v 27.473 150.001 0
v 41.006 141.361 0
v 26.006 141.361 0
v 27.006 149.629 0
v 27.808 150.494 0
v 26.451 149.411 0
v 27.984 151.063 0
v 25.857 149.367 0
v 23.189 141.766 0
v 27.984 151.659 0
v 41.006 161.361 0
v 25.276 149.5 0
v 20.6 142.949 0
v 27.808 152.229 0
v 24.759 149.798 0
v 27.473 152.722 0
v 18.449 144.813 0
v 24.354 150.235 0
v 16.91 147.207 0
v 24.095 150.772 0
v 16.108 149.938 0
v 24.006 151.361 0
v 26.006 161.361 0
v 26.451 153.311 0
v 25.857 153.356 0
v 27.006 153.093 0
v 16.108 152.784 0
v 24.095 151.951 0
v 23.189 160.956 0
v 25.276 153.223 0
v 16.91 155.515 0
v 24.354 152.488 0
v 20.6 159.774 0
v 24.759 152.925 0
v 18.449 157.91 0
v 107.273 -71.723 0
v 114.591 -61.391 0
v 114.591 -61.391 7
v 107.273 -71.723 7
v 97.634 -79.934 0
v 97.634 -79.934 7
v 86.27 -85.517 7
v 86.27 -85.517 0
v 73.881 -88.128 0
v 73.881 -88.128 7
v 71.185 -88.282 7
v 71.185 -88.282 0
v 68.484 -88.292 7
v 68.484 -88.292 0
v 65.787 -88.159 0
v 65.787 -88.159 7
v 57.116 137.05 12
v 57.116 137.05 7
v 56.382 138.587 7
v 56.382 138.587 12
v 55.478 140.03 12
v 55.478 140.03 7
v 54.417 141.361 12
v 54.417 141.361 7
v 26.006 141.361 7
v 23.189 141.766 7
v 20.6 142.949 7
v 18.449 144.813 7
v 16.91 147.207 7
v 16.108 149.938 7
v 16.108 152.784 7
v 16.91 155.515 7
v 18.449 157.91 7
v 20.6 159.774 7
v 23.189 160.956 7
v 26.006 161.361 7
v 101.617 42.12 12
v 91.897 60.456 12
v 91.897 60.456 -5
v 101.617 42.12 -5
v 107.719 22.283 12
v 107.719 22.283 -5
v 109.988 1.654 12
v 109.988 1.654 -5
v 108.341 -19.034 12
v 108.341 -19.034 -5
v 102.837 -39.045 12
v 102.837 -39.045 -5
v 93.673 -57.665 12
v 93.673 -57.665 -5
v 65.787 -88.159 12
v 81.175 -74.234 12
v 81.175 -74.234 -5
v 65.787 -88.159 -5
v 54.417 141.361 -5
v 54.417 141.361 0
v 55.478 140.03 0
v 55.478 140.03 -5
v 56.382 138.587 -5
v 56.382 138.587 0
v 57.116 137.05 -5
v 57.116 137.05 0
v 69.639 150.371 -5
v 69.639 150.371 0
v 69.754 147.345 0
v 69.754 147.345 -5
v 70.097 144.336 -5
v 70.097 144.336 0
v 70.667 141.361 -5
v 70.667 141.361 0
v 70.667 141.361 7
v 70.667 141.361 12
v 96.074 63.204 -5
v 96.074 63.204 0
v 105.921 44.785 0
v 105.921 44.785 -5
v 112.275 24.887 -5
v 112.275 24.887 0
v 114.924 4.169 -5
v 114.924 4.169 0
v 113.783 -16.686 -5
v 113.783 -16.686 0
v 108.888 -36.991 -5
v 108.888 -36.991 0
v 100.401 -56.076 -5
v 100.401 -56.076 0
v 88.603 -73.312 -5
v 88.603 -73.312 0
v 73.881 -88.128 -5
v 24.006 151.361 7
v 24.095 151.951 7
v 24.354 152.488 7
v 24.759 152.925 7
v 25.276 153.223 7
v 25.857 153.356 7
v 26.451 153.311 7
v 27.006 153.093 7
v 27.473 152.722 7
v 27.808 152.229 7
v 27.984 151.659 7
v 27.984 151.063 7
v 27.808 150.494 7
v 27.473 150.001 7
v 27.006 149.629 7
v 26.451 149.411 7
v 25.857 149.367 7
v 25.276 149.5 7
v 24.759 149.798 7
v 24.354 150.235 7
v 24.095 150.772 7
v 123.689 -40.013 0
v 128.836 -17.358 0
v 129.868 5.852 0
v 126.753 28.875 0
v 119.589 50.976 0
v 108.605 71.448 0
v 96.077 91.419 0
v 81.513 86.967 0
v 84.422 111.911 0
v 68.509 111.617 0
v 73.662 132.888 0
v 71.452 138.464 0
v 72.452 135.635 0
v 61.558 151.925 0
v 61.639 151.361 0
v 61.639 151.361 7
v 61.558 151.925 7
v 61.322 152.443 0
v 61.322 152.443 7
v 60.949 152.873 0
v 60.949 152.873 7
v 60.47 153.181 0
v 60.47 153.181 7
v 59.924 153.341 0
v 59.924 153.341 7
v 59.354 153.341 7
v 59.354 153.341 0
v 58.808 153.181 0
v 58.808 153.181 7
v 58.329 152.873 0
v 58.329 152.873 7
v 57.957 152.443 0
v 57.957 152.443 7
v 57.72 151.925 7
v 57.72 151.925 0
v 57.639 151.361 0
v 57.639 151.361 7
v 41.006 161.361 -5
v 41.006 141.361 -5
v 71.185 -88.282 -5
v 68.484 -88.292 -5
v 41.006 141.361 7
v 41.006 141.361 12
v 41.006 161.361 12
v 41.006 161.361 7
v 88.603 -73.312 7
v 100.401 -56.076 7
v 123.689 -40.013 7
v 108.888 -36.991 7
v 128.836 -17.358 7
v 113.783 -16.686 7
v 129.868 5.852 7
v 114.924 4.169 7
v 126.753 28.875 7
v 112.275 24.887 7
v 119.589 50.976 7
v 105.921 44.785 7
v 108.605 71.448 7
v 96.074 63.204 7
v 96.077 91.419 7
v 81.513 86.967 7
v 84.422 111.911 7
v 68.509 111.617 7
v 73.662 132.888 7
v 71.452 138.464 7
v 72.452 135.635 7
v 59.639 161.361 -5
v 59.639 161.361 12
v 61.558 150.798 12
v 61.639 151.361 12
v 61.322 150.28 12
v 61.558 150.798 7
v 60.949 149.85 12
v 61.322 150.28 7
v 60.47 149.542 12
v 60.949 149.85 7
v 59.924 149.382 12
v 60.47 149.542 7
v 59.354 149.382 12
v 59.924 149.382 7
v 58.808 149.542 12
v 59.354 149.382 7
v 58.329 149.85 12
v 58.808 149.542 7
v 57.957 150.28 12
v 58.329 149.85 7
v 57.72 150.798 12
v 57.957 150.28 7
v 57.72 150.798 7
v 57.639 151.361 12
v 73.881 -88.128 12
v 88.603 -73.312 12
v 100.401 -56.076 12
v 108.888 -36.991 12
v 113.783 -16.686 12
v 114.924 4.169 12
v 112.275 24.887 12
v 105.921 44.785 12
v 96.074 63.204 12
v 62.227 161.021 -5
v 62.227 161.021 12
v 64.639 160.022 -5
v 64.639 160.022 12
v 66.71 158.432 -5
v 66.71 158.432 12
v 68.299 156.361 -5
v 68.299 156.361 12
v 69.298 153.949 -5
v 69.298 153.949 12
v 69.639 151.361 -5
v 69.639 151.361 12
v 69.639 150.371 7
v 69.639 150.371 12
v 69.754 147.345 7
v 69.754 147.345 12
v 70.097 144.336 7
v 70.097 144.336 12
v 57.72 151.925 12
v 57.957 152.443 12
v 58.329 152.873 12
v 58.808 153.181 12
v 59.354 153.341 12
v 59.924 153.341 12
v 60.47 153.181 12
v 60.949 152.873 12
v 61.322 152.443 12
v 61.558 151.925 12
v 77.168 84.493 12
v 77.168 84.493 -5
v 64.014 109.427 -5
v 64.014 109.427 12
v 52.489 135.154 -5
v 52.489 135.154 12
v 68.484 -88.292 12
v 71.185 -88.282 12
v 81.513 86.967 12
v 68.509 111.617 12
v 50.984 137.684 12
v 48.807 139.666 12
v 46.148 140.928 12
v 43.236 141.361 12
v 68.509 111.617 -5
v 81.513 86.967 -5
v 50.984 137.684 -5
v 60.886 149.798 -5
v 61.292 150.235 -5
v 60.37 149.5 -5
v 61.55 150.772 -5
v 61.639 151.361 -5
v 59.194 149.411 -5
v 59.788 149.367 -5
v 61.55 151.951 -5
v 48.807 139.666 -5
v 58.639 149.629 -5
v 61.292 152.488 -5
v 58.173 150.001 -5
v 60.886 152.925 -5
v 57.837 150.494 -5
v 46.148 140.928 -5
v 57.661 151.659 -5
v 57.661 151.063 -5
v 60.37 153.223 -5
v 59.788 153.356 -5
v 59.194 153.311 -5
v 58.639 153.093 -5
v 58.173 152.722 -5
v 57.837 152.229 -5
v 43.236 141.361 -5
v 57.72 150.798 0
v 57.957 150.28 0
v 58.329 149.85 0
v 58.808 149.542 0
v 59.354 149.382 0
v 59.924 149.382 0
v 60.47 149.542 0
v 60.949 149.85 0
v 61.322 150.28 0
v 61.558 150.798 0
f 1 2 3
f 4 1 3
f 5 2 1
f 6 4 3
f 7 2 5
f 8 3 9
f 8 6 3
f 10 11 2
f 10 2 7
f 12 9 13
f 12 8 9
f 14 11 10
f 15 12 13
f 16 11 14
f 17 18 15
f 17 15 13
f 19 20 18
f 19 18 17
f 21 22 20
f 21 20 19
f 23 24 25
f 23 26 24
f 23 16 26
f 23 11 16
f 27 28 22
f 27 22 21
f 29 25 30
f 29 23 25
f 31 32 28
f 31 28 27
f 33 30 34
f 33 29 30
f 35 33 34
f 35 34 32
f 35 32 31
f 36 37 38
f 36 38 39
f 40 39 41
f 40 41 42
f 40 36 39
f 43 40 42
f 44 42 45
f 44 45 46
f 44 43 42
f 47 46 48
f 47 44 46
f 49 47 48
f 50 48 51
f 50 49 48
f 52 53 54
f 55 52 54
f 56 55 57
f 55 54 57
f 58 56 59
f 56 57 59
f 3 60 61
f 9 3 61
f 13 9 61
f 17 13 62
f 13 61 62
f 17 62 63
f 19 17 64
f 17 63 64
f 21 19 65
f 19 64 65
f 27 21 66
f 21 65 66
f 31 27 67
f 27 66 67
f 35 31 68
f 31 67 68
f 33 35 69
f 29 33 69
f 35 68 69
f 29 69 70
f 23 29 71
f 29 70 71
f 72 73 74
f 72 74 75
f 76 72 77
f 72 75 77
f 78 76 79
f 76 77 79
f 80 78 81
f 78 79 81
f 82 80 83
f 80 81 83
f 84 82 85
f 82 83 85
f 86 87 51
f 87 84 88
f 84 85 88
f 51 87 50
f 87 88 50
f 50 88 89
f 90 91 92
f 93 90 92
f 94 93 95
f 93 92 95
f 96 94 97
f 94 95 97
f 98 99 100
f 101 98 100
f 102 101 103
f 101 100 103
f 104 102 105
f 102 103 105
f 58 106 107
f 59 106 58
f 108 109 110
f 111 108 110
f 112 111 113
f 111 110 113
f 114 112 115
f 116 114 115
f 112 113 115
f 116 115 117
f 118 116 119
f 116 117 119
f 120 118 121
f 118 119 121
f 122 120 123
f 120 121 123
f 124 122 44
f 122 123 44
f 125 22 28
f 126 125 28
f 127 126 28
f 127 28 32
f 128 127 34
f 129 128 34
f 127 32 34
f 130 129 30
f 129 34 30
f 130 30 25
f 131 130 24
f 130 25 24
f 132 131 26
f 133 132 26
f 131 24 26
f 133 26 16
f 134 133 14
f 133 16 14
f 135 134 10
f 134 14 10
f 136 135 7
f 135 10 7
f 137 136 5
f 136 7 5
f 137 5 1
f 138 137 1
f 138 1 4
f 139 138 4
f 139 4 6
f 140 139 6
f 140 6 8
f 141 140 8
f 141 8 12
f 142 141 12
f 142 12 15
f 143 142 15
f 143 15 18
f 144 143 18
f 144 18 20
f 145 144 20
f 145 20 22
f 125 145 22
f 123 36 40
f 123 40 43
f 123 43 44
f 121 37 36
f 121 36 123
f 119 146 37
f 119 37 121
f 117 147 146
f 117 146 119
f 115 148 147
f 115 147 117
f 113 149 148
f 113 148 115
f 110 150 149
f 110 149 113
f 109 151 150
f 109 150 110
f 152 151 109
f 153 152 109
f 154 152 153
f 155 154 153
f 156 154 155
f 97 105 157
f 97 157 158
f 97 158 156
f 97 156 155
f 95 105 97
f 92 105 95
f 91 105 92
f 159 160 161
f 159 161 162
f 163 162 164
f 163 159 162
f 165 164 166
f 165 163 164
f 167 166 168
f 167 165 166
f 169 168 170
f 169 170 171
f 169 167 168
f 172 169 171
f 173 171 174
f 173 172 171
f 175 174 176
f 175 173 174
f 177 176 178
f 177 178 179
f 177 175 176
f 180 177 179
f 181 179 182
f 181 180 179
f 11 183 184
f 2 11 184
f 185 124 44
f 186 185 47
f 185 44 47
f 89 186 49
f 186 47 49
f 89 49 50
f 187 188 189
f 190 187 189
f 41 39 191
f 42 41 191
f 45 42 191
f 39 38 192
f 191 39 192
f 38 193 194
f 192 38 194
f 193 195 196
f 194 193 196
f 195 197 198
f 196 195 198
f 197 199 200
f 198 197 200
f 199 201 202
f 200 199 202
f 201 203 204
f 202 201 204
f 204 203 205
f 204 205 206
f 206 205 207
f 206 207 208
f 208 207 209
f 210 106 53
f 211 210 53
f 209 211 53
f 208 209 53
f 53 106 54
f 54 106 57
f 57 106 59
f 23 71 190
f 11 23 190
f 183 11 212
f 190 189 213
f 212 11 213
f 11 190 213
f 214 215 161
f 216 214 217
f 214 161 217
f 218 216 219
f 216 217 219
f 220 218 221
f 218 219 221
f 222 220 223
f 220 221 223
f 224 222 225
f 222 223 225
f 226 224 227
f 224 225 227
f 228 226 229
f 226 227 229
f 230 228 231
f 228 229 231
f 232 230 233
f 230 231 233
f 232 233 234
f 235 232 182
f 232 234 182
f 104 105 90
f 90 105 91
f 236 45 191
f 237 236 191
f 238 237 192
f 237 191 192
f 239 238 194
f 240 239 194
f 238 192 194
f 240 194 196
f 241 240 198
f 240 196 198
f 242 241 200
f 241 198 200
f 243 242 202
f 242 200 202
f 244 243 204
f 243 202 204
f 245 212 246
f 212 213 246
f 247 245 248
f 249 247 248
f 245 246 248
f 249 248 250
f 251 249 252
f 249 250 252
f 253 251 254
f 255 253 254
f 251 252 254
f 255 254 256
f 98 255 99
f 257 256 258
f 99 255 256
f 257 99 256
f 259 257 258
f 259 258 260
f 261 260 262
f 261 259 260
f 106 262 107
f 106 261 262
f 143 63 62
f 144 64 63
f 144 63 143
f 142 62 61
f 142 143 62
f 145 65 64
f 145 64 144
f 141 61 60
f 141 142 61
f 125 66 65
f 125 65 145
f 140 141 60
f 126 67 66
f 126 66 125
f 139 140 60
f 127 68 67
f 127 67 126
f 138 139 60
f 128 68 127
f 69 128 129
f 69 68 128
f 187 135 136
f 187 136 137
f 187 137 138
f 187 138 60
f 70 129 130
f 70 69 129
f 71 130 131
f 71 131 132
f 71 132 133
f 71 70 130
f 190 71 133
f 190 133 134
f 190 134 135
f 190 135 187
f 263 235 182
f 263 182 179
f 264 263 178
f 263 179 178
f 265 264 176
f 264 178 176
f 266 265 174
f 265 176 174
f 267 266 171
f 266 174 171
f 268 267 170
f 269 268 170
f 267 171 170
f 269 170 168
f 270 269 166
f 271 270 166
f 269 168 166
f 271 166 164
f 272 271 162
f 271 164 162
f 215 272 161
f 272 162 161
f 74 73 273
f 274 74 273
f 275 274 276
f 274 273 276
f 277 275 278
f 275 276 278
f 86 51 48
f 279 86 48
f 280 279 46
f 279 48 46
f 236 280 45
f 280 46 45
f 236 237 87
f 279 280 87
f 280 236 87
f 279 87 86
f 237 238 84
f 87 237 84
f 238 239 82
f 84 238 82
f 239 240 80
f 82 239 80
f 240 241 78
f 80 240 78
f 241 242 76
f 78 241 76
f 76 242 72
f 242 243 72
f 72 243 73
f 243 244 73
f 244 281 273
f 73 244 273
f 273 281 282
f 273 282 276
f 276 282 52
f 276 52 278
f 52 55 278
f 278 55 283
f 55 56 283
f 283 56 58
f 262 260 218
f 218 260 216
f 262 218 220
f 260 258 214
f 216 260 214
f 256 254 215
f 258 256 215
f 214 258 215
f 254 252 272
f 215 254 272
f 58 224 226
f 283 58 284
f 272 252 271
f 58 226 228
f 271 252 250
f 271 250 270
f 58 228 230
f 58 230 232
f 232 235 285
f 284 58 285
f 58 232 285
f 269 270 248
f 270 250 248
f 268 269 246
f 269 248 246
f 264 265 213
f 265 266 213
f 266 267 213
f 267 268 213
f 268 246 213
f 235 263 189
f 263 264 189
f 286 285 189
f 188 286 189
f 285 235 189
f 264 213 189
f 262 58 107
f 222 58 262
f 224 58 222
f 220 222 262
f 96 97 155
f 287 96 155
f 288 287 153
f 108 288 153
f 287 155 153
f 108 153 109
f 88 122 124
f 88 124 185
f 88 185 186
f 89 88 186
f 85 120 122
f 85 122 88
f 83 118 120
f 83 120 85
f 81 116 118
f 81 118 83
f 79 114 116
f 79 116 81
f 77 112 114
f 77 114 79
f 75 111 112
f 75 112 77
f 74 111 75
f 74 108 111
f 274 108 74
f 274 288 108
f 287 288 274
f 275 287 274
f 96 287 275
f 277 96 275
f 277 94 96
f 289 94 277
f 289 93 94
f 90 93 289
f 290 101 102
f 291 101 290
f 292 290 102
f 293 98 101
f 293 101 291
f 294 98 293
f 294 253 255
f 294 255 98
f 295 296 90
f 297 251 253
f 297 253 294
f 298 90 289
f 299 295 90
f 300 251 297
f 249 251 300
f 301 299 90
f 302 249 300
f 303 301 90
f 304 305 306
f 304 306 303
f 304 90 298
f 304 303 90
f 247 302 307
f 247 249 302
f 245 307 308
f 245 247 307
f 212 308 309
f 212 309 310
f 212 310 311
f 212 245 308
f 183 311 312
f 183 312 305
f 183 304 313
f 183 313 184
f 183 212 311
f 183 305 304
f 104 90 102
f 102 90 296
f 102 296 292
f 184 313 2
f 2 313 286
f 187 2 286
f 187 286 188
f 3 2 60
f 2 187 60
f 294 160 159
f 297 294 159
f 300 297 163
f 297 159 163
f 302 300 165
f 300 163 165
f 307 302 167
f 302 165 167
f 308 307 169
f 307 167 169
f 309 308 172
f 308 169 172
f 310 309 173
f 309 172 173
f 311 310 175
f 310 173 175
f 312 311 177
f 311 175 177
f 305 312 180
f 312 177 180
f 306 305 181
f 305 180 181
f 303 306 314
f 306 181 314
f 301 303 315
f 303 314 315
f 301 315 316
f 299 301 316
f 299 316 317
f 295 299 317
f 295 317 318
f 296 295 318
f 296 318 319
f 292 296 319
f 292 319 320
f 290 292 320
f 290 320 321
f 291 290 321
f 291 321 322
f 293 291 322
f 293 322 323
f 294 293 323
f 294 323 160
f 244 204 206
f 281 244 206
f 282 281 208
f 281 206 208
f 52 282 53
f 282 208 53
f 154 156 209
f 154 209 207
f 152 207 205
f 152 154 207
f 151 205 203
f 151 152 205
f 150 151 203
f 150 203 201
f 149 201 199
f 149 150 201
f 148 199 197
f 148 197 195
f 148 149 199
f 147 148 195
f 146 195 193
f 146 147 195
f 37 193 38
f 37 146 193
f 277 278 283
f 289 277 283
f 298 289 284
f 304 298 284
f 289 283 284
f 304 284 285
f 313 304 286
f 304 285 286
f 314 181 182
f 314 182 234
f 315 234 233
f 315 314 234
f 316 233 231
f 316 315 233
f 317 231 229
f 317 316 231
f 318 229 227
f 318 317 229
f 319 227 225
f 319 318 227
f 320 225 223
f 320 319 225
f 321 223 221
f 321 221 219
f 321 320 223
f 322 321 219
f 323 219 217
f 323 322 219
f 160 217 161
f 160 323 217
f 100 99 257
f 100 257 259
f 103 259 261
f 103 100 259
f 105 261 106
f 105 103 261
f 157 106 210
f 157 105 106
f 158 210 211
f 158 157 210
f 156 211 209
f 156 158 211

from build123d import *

# Parameters (mm, degrees)
CROQUIS1_R              = 2
SALIENTE_EXTRUIR1_DEPTH = 7
SALIENTE_EXTRUIR2_DEPTH = 5
SALIENTE_EXTRUIR3_DEPTH = 5
SALIENTE_EXTRUIR4_DEPTH = 5
CROQUIS6_R              = 2
CORTAR_EXTRUIR1_DEPTH   = 20
SALIENTE_EXTRUIR5_DEPTH = 5
CROQUIS8_R              = 2
CORTAR_EXTRUIR3_DEPTH   = 20
CORTAR_EXTRUIR4_DEPTH   = 20
CROQUIS10_R             = 2
CORTAR_EXTRUIR5_DEPTH   = 5
CROQUIS12_R             = 2
CORTAR_EXTRUIR6_DEPTH   = 5
CROQUIS13_R             = 2
CORTAR_EXTRUIR7_DEPTH   = 45


with BuildPart() as part:
    # Croquis1 → Saliente-Extruir1 (new body)
    with BuildSketch(Plane.XY):
        with BuildLine():
            Line((0, 161.361306161), (59.639031754, 161.361306161))
            ThreePointArc((59.639031754, 161.361306161), (66.710099565, 158.432373972), (69.639031754, 151.361306161))
            Line((69.639031754, 151.361306161), (69.639031754, 150.370999495))
            ThreePointArc((69.639031754, 150.370999495), (70.657777859, 141.400946832), (73.662123993, 132.887804479))
            ThreePointArc((73.662123993, 132.887804479), (90.138531177, 101.602103147), (108.605347016, 71.44843315))
            ThreePointArc((108.605347016, 71.44843315), (129.868212527, 5.85212568), (114.591350051, -61.390736219))
            ThreePointArc((114.591350051, -61.390736219), (94.163470567, -82.020942746), (65.787006352, -88.15934321))
            ThreePointArc((65.787006352, -88.15934321), (108.340691896, -19.034034767), (91.89683209, 60.456366511))
            ThreePointArc((91.89683209, 60.456366511), (70.390740309, 96.854398001), (52.489257919, 135.15407957))
            ThreePointArc((52.489257919, 135.15407957), (48.807435802, 139.665754791), (43.236427549, 141.361306161))
            Line((43.236427549, 141.361306161), (0, 141.361306161))
            Line((0, 141.361306161), (0, 161.361306161))
        make_face()
        with Locations((59.639031754, 151.361306161)):
            Circle(CROQUIS1_R, mode=Mode.SUBTRACT)
    extrude(amount=SALIENTE_EXTRUIR1_DEPTH)

    # Croquis2 → Saliente-Extruir2 (add)
    with BuildSketch(Plane.XY.offset(7)):
        with BuildLine():
            Line((54.416767437, 141.361306161), (43.236427549, 141.361306161))
            ThreePointArc((43.236427549, 141.361306161), (48.807435802, 139.665754791), (52.489257919, 135.15407957))
            ThreePointArc((52.489257919, 135.15407957), (70.390740309, 96.854398001), (91.89683209, 60.456366511))
            ThreePointArc((91.89683209, 60.456366511), (108.340691896, -19.034034767), (65.787006352, -88.15934321))
            ThreePointArc((65.787006352, -88.15934321), (69.834622147, -88.304656697), (73.881004217, -88.128299745))
            ThreePointArc((73.881004217, -88.128299745), (113.782985393, -16.686288834), (96.073960822, 63.204383171))
            ThreePointArc((96.073960822, 63.204383171), (74.813060375, 99.187440057), (57.115673105, 137.050466275))
            ThreePointArc((57.115673105, 137.050466275), (55.950260204, 139.321108873), (54.416767437, 141.361306161))
        make_face()
    extrude(amount=SALIENTE_EXTRUIR2_DEPTH)

    # Croquis4 → Saliente-Extruir4 (add)
    with BuildSketch(Plane.XY.offset(7)):
        with BuildLine():
            Line((69.639031754, 151.361306161), (69.639031754, 150.370999495))
            ThreePointArc((69.639031754, 150.370999495), (69.896834815, 145.836930406), (70.666920879, 141.361306161))
            Line((70.666920879, 141.361306161), (54.416767437, 141.361306161))
            Line((54.416767437, 141.361306161), (0, 141.361306161))
            Line((0, 141.361306161), (0, 161.361306161))
            Line((0, 161.361306161), (59.639031754, 161.361306161))
            ThreePointArc((59.639031754, 161.361306161), (66.710099565, 158.432373972), (69.639031754, 151.361306161))
        make_face()
    extrude(amount=SALIENTE_EXTRUIR4_DEPTH)

    # Croquis6 → Cortar-Extruir1 (cut)
    with BuildSketch(Plane(origin=(0, 0, 0), x_dir=(-1, 0, 0), z_dir=(0, 0, -1))):
        with Locations((-59.639031754, 151.361306161)):
            Circle(CROQUIS6_R)
    extrude(amount=-CORTAR_EXTRUIR1_DEPTH, mode=Mode.SUBTRACT)



with BuildPart() as body_2:
    # Croquis3 → Saliente-Extruir3 (new body)
    with BuildSketch(Plane(origin=(0, 0, 0), x_dir=(-1, 0, 0), z_dir=(0, 0, -1))):
        with BuildLine():
            Line((-43.236427549, 141.361306161), (-54.416767437, 141.361306161))
            ThreePointArc((-54.416767437, 141.361306161), (-55.950260204, 139.321108873), (-57.115673105, 137.050466275))
            ThreePointArc((-57.115673105, 137.050466275), (-74.813060375, 99.187440057), (-96.073960822, 63.204383171))
            ThreePointArc((-96.073960822, 63.204383171), (-113.782985393, -16.686288834), (-73.881004217, -88.128299745))
            ThreePointArc((-73.881004217, -88.128299745), (-69.834622147, -88.304656697), (-65.787006352, -88.15934321))
            ThreePointArc((-65.787006352, -88.15934321), (-108.340691896, -19.034034767), (-91.89683209, 60.456366511))
            ThreePointArc((-91.89683209, 60.456366511), (-70.390740309, 96.854398001), (-52.489257919, 135.15407957))
            ThreePointArc((-52.489257919, 135.15407957), (-48.807435802, 139.665754791), (-43.236427549, 141.361306161))
        make_face()
    extrude(amount=SALIENTE_EXTRUIR3_DEPTH)


with BuildPart() as part_1:
    add(part.part)

    add(body_2.part)  # Saliente-Extruir5 merges body 2
    # Croquis7 → Saliente-Extruir5 (add)
    with BuildSketch(Plane(origin=(0, 0, 0), x_dir=(-1, 0, 0), z_dir=(0, 0, -1))):
        with BuildLine():
            Line((0, 161.361306161), (-59.639031754, 161.361306161))
            ThreePointArc((-59.639031754, 161.361306161), (-66.710099565, 158.432373972), (-69.639031754, 151.361306161))
            Line((-69.639031754, 151.361306161), (-69.639031754, 150.370999495))
            ThreePointArc((-69.639031754, 150.370999495), (-69.896834815, 145.836930406), (-70.666920879, 141.361306161))
            Line((-70.666920879, 141.361306161), (-54.416767437, 141.361306161))
            Line((-54.416767437, 141.361306161), (0, 141.361306161))
            Line((0, 141.361306161), (0, 161.361306161))
        make_face()
    extrude(amount=SALIENTE_EXTRUIR5_DEPTH)

    # Croquis8 → Cortar-Extruir3 (cut)
    with BuildSketch(Plane.XY.offset(12)):
        with Locations((59.639031754, 151.361306161)):
            Circle(CROQUIS8_R)
    extrude(amount=-CORTAR_EXTRUIR3_DEPTH, mode=Mode.SUBTRACT)

    # Croquis9 → Cortar-Extruir4 (cut)
    with BuildSketch(Plane.XY.offset(12)):
        with BuildLine():
            ThreePointArc((26.006407842, 141.361306161), (16.006407842, 151.361306161), (26.006407842, 161.361306161))
            Line((26.006407842, 161.361306161), (0, 161.361306161))
            Line((0, 161.361306161), (0, 141.361306161))
            Line((0, 141.361306161), (26.006407842, 141.361306161))
        make_face()
    extrude(amount=-CORTAR_EXTRUIR4_DEPTH, mode=Mode.SUBTRACT)

    # Croquis10 → Cortar-Extruir5 (cut)
    with BuildSketch(Plane.XY.offset(12)):
        with BuildLine():
            Line((41.006407842, 161.361306161), (26.006407842, 161.361306161))
            ThreePointArc((26.006407842, 161.361306161), (16.006407842, 151.361306161), (26.006407842, 141.361306161))
            Line((26.006407842, 141.361306161), (41.006407842, 141.361306161))
            Line((41.006407842, 141.361306161), (41.006407842, 161.361306161))
        make_face()
        with Locations((26.006407842, 151.361306161)):
            Circle(CROQUIS10_R, mode=Mode.SUBTRACT)
    extrude(amount=-CORTAR_EXTRUIR5_DEPTH, mode=Mode.SUBTRACT)

    # Croquis12 → Cortar-Extruir6 (cut)
    with BuildSketch(Plane(origin=(0, 0, -5), x_dir=(-1, 0, 0), z_dir=(0, 0, -1))):
        with BuildLine():
            Line((-26.006407842, 161.361306161), (-41.006407842, 161.361306161))
            Line((-41.006407842, 161.361306161), (-41.006407842, 141.361306161))
            Line((-41.006407842, 141.361306161), (-26.006407842, 141.361306161))
            ThreePointArc((-26.006407842, 141.361306161), (-16.006407842, 151.361306161), (-26.006407842, 161.361306161))
        make_face()
        with Locations((-26.006407842, 151.361306161)):
            Circle(CROQUIS12_R, mode=Mode.SUBTRACT)
    extrude(amount=-CORTAR_EXTRUIR6_DEPTH, mode=Mode.SUBTRACT)

    # Croquis13 → Cortar-Extruir7 (cut)
    with BuildSketch(Plane(origin=(0, 0, -5), x_dir=(-1, 0, 0), z_dir=(0, 0, -1))):
        with Locations((-26.006407842, 151.361306161)):
            Circle(CROQUIS13_R)
    extrude(amount=-CORTAR_EXTRUIR7_DEPTH, mode=Mode.SUBTRACT)


solid = part_1.part
